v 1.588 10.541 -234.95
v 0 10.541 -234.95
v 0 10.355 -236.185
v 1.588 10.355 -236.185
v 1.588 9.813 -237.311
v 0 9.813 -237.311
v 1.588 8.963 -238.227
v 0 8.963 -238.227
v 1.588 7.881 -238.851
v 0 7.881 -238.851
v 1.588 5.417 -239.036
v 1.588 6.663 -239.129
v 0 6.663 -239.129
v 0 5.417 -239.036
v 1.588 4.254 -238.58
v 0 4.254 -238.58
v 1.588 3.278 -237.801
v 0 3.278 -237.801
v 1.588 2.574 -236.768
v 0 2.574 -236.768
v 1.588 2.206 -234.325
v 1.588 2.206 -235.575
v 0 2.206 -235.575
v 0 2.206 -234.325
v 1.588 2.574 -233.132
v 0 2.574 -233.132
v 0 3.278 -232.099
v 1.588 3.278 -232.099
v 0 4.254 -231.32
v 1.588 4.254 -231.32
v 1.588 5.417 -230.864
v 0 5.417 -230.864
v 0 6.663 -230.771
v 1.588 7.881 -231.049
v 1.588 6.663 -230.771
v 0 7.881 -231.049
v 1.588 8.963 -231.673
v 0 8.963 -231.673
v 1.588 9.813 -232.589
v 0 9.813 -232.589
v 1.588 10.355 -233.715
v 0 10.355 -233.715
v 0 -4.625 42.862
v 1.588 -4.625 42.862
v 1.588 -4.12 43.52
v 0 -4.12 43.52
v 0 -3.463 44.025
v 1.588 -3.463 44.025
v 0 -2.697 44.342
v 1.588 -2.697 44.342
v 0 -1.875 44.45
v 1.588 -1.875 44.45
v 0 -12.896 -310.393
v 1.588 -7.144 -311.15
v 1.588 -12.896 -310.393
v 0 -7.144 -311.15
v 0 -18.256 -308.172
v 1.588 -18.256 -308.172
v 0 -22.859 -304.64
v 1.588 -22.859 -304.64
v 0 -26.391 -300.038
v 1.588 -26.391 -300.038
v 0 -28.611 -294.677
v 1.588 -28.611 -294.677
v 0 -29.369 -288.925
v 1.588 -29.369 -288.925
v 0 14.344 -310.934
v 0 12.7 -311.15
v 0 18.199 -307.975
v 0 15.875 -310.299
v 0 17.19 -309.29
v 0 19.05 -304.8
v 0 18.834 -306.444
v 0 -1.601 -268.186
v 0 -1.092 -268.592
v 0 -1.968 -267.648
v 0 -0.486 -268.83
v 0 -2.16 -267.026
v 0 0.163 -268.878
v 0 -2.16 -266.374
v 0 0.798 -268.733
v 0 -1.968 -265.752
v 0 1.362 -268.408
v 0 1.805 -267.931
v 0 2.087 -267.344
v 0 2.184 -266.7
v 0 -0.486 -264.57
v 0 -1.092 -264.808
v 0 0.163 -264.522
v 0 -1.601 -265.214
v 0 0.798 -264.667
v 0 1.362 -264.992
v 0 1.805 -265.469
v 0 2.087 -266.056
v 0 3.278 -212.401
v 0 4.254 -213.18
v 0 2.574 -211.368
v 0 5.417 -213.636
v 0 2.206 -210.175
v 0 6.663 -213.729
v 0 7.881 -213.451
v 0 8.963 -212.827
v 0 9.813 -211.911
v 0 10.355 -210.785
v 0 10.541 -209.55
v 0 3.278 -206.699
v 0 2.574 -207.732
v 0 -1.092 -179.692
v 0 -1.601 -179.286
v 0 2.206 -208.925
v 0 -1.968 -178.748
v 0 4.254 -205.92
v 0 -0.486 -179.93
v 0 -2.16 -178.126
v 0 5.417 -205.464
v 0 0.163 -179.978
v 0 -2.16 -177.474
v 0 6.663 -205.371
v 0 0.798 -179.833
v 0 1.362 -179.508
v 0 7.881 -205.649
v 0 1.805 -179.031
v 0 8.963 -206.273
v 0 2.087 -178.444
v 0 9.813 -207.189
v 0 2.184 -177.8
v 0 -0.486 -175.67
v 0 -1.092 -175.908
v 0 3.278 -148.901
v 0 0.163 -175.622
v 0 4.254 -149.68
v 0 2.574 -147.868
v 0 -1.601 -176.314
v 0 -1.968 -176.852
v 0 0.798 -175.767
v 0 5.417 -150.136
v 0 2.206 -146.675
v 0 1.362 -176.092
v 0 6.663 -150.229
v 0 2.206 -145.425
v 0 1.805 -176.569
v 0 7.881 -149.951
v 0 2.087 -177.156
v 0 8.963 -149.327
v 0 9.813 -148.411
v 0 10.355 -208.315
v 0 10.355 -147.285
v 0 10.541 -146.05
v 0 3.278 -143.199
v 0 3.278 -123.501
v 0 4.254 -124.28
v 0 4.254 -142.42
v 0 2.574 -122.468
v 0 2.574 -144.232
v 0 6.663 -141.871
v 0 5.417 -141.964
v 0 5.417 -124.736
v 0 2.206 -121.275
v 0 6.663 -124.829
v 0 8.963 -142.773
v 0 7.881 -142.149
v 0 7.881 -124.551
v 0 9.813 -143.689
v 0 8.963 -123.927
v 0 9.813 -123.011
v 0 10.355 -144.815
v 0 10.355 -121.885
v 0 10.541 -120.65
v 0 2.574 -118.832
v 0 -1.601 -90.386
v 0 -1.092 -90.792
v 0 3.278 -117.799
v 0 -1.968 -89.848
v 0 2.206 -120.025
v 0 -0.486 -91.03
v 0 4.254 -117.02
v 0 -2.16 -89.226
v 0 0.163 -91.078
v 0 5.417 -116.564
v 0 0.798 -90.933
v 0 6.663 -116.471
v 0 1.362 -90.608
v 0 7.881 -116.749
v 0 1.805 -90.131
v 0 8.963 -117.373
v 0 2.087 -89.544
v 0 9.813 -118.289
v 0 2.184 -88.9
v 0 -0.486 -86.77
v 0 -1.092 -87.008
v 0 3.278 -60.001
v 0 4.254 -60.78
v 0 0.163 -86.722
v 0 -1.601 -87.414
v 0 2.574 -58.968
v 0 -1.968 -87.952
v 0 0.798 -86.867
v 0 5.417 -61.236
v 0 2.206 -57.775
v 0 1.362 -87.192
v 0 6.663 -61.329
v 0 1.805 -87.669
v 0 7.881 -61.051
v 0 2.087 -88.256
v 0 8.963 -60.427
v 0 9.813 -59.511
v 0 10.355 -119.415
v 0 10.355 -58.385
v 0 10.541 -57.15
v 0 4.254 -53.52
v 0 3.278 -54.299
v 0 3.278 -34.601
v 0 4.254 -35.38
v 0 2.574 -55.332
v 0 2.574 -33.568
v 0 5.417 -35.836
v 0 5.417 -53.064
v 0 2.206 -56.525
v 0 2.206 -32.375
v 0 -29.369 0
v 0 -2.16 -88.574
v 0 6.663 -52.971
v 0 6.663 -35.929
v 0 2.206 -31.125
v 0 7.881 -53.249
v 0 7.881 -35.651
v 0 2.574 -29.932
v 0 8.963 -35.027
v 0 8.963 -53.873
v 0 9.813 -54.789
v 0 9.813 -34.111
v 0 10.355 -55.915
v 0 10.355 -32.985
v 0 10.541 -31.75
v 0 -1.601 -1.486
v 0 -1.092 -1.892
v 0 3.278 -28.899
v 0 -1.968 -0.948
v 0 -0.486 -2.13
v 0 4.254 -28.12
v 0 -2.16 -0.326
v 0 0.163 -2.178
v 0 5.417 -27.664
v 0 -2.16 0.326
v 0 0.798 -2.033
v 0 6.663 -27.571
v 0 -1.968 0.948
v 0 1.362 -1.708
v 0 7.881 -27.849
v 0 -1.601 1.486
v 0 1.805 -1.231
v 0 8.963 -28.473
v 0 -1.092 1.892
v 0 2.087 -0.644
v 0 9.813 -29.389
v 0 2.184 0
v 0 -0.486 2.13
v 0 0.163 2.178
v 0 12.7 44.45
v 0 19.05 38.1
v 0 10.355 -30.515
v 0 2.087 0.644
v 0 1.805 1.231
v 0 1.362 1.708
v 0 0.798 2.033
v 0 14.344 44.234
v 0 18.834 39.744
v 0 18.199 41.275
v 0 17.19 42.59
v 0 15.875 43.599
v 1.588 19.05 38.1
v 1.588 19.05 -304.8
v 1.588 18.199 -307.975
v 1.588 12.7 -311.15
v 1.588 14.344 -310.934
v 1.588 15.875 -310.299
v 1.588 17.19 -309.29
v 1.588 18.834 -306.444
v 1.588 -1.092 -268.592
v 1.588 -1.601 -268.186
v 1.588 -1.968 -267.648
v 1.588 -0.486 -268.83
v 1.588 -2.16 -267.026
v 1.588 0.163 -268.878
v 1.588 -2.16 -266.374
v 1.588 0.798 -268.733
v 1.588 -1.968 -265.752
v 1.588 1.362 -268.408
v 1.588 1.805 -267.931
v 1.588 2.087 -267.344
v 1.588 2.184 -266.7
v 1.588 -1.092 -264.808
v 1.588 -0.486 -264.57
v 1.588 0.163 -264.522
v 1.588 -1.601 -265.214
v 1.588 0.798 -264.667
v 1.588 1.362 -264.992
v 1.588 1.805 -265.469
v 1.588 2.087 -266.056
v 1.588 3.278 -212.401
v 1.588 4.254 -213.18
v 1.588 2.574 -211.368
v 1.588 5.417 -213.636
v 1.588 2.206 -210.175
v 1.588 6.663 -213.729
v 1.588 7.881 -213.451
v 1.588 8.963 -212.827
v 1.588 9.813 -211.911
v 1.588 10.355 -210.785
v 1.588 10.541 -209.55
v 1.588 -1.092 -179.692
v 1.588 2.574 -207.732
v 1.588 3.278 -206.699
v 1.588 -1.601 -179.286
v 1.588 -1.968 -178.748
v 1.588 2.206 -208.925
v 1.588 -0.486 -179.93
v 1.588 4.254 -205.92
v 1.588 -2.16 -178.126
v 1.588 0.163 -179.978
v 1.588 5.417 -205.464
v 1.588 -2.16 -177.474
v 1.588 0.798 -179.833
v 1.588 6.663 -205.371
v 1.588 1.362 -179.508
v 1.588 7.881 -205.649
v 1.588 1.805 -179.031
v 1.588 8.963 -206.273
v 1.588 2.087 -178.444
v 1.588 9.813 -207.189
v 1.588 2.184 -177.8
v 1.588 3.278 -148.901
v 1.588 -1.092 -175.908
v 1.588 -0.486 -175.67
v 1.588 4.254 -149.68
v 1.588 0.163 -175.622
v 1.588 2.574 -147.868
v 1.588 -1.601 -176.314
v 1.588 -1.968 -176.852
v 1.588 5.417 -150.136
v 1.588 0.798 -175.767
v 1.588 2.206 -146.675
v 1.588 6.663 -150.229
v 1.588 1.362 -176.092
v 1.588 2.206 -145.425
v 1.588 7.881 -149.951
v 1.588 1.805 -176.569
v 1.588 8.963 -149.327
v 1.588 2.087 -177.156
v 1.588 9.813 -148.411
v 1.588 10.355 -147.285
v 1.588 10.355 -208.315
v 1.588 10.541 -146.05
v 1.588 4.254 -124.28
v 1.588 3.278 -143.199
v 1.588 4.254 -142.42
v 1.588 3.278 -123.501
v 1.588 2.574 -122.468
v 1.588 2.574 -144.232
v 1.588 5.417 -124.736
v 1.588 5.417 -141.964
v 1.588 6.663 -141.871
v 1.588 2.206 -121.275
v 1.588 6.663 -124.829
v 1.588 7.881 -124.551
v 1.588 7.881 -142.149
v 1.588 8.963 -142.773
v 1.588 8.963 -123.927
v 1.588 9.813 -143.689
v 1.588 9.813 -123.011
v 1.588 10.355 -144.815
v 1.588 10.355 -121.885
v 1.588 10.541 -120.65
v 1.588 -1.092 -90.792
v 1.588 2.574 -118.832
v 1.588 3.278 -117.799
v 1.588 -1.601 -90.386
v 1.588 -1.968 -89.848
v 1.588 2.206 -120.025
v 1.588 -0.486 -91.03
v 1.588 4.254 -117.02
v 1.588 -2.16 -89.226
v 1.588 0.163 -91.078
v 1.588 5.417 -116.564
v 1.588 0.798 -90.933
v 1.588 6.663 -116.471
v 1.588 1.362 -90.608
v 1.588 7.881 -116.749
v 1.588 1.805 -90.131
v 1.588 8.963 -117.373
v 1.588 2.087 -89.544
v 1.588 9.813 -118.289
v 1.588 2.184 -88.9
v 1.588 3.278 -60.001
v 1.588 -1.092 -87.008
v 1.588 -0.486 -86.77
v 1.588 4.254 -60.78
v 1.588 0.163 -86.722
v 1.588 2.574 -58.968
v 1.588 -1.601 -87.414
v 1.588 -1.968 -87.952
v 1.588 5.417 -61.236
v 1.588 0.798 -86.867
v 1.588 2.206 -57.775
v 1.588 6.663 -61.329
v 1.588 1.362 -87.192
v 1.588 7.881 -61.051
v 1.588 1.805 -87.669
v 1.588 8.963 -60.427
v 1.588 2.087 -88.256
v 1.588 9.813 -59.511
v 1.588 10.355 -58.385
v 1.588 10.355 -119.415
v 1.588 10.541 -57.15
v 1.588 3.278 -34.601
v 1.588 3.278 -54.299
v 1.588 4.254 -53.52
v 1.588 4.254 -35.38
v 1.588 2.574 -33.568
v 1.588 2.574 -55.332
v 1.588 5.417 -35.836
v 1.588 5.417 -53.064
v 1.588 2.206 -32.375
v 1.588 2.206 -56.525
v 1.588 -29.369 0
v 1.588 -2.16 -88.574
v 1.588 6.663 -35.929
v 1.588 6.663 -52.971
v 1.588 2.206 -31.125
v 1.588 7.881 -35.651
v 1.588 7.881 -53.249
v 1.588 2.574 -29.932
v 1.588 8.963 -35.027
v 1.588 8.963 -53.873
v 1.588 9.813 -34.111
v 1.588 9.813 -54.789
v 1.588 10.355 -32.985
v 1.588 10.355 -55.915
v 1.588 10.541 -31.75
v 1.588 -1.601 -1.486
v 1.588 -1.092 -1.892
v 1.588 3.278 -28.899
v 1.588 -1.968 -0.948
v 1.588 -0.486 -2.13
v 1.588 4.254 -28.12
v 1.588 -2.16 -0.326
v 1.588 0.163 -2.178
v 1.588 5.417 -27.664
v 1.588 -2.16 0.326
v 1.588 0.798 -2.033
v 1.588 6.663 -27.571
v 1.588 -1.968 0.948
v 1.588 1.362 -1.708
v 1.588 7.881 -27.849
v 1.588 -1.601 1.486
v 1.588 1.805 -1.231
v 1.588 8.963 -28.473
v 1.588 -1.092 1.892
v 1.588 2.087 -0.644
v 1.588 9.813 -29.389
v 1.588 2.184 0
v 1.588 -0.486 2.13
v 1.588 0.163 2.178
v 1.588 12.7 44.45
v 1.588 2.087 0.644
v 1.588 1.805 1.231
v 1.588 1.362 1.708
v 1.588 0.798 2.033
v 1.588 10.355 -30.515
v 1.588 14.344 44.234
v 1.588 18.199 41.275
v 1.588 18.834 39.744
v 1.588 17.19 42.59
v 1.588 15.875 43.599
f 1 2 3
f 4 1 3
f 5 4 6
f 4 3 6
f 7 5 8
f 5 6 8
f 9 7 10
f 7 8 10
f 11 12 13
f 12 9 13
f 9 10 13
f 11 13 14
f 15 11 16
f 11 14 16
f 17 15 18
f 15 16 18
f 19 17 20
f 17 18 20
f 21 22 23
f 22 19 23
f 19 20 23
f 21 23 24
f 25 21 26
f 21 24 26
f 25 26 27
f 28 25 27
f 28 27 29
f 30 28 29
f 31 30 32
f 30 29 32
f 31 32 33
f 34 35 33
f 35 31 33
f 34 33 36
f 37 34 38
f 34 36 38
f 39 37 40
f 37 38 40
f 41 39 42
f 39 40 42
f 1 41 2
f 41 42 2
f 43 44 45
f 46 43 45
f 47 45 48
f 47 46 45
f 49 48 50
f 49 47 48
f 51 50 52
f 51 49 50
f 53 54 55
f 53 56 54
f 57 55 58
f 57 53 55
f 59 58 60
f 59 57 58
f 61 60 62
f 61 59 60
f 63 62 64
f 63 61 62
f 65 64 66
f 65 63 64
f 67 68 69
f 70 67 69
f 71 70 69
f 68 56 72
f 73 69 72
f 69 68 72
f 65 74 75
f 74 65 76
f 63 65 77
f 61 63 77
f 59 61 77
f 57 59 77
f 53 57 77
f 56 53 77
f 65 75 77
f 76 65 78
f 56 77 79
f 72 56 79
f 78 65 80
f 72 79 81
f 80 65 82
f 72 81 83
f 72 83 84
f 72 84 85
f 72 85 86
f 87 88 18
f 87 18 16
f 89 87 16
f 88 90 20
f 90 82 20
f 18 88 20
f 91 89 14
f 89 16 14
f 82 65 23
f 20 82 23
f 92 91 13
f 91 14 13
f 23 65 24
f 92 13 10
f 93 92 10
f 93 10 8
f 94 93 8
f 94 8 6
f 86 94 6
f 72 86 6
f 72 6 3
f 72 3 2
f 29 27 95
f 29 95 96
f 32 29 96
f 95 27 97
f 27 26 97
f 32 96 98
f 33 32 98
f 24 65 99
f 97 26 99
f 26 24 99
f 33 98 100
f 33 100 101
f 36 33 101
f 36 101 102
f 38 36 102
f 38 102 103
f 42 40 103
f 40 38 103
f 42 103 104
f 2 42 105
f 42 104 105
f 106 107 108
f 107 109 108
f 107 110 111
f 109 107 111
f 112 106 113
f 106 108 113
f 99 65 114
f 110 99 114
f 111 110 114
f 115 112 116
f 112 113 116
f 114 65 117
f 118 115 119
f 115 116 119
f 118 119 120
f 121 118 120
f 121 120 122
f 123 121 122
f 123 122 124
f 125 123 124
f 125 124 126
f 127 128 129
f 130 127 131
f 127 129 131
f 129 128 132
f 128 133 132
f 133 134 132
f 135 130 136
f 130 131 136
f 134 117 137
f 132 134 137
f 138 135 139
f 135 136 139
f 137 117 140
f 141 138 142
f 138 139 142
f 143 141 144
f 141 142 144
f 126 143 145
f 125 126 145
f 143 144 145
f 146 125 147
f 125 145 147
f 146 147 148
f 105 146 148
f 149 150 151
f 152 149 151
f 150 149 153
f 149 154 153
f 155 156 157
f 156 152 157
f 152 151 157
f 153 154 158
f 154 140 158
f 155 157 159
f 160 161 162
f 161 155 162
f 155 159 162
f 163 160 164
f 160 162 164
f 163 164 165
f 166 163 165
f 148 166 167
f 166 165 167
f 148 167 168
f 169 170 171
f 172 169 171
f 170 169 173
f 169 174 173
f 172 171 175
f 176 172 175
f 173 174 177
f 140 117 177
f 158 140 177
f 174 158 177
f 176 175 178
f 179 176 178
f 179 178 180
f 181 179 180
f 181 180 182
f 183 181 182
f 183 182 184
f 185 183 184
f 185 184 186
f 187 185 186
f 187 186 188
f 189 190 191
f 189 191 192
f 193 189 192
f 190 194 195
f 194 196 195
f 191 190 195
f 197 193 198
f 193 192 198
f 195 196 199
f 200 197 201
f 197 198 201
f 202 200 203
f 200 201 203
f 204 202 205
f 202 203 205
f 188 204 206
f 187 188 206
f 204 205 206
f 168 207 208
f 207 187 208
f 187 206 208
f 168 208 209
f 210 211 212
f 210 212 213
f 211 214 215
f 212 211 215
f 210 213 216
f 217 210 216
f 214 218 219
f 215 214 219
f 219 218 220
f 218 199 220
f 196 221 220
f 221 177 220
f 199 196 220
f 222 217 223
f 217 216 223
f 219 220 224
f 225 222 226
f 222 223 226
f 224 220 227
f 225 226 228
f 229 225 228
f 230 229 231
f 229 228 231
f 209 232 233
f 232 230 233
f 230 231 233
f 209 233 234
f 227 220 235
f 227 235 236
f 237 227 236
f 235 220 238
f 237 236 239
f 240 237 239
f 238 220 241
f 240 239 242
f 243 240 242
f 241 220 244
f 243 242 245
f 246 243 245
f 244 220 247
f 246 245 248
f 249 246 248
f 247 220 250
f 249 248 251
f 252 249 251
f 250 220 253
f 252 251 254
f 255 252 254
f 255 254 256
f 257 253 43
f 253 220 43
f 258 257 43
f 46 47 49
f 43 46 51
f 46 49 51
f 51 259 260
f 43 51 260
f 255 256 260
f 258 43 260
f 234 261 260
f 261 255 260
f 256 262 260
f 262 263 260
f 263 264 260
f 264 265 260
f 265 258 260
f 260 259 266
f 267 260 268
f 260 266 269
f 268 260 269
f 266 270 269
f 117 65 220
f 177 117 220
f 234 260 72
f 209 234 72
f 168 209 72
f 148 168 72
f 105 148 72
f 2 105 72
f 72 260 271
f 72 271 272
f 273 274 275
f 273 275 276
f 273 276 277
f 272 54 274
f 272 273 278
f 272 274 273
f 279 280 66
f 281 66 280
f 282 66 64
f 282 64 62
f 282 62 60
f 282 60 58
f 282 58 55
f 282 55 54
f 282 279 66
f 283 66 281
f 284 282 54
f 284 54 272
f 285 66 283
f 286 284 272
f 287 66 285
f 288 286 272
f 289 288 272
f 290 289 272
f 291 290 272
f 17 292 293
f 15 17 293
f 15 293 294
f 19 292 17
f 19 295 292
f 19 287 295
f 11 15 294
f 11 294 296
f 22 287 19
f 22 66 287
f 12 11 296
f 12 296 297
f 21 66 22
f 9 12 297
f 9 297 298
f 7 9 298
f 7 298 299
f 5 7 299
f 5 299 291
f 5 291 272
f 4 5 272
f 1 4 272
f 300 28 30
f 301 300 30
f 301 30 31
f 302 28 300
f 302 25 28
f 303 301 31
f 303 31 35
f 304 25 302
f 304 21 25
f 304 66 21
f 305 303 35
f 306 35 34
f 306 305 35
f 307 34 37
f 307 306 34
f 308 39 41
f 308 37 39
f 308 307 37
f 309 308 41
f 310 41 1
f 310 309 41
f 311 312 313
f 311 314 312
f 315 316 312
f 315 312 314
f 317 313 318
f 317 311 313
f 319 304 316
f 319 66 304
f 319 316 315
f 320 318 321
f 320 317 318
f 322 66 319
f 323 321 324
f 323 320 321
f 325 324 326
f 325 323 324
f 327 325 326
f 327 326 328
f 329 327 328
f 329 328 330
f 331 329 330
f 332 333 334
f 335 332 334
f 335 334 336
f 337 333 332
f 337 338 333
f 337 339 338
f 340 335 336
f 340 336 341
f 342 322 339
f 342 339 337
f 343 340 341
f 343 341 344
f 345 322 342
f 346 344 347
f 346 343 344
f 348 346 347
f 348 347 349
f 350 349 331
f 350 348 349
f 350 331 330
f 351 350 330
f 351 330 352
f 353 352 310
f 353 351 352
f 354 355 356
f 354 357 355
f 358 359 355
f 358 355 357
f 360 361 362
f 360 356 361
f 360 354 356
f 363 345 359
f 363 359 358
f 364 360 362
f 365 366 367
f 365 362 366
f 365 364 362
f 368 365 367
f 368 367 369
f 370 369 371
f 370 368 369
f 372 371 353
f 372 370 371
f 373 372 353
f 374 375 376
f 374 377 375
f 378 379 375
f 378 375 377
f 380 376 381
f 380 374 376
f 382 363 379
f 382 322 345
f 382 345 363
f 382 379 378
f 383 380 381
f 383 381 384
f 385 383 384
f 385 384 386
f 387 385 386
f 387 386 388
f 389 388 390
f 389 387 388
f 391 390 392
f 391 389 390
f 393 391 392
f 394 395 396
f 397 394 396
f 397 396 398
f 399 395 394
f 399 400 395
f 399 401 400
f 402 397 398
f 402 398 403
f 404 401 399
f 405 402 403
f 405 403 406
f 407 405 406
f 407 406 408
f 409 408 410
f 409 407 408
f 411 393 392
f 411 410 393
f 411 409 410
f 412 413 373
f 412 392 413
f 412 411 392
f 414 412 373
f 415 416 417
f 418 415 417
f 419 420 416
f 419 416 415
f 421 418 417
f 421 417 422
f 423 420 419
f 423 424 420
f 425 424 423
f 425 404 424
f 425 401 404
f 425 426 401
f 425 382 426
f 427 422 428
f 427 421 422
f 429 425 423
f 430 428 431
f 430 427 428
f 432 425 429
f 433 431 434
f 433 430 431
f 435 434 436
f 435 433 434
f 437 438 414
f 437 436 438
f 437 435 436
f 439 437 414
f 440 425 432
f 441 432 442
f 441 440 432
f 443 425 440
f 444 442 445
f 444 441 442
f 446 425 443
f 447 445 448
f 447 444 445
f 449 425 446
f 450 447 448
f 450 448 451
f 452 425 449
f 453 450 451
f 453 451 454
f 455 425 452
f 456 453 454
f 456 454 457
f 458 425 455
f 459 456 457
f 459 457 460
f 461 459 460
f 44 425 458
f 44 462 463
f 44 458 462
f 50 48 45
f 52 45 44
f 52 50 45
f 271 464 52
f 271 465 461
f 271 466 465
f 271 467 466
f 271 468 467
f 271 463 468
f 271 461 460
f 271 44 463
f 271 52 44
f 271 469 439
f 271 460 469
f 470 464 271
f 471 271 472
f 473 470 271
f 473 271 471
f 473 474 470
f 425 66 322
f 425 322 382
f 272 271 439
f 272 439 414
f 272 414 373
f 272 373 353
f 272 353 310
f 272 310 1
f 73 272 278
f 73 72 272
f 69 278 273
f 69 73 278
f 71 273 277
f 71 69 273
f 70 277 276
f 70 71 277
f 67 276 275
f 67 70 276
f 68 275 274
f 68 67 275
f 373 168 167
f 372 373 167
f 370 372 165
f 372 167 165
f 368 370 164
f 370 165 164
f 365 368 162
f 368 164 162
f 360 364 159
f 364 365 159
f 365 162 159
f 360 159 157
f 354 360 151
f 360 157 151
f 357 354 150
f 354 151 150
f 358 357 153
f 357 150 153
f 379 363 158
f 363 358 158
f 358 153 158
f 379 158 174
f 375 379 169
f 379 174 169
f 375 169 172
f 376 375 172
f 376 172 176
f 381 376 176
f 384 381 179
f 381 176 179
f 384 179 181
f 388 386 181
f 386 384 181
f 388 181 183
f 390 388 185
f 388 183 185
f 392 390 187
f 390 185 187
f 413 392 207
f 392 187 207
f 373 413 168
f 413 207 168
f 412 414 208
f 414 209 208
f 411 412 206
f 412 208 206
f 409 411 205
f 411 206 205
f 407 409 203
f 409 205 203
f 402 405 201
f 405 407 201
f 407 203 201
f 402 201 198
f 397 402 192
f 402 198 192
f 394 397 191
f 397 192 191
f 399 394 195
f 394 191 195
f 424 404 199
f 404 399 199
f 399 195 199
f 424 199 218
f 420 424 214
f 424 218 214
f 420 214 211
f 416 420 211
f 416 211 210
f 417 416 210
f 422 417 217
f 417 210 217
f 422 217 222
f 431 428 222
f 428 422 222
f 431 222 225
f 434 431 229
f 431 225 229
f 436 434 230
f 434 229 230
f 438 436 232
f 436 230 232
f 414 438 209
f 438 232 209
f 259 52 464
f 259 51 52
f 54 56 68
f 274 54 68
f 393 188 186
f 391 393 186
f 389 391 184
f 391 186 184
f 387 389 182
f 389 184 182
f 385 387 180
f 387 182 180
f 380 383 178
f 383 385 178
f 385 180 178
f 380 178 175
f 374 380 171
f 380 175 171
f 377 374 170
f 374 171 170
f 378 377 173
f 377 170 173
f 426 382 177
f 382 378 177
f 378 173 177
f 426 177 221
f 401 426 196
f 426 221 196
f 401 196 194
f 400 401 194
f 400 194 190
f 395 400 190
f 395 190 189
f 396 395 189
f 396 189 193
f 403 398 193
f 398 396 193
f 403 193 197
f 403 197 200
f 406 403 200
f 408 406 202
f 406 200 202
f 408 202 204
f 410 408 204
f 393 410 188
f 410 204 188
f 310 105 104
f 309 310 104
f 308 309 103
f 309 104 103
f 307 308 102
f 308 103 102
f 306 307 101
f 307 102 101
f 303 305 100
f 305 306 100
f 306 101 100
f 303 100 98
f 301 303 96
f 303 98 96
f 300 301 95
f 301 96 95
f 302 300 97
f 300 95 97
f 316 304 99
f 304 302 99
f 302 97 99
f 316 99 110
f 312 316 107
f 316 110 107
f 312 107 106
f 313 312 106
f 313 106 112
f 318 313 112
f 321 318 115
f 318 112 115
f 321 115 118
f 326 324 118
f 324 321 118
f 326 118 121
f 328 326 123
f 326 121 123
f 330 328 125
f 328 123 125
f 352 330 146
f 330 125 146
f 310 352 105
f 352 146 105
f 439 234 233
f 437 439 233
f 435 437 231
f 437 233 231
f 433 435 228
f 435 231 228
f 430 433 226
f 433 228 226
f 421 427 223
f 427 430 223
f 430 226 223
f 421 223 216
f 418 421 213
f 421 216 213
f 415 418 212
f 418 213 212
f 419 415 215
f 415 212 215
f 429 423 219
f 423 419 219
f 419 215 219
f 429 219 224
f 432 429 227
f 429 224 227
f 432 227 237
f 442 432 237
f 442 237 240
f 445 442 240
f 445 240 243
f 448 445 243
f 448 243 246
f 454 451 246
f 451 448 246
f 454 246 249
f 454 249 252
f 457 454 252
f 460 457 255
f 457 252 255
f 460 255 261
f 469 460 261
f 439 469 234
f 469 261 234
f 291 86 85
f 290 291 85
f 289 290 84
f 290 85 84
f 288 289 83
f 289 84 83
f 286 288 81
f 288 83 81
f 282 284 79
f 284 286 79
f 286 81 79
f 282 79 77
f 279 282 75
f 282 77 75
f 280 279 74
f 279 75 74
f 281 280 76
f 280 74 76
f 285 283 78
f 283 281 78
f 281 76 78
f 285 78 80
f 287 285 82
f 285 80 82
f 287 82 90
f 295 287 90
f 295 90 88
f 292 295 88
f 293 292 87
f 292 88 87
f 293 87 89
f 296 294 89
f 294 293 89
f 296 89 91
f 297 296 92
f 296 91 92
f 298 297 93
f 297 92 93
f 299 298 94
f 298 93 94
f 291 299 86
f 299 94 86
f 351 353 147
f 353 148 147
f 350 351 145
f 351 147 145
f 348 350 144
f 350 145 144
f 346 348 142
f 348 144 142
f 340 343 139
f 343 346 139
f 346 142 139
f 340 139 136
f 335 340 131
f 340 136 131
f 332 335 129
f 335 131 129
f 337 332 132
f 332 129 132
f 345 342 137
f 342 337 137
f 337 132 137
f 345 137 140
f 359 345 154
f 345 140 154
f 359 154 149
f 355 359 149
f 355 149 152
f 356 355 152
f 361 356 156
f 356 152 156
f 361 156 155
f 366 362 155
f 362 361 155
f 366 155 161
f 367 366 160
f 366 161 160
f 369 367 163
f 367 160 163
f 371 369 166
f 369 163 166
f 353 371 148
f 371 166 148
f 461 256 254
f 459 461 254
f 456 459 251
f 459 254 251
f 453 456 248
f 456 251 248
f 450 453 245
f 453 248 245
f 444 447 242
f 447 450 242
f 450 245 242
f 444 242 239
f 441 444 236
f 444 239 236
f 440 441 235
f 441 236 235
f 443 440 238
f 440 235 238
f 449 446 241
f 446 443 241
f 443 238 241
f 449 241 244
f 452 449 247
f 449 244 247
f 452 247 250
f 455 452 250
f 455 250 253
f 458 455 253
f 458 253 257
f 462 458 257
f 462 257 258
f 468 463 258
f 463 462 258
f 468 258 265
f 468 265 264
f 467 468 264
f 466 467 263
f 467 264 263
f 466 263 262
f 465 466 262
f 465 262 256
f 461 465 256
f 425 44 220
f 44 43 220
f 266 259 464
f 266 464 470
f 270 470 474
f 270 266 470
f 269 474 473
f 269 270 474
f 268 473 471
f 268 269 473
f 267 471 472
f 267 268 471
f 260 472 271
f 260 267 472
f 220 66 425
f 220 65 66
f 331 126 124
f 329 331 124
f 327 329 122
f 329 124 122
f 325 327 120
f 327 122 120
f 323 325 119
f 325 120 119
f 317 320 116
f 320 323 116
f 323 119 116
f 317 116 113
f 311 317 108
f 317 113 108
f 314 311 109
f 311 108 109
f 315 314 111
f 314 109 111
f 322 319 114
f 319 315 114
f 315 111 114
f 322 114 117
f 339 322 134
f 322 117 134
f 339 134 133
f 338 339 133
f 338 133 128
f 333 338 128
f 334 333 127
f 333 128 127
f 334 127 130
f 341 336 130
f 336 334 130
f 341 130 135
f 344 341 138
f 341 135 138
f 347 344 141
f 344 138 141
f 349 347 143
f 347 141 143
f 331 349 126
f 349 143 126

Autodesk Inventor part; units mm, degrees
ref_plane "YZ Plane" through (0, 0, 0) normal (1, 0, 0) x (0, 1, 0)
ref_plane "XZ Plane" through (0, 0, 0) normal (0, 1, 0) x (-1, 0, 0)
ref_plane "XY Plane" through (0, 0, 0) normal (0, 0, 1) x (1, 0, 0)
sketch "main" plane through (0, 0, 0) normal (0, 0, 1) x (1, 0, 0)
  circle A0 centre (-6.8277, 139.0371) radius 2.1844
  circle A1 centre (-0.4777, 107.2871) radius 4.191
  line L0 (-8.7029, 183.4871) -> (6.7737, 183.4871)
  circle A2 centre (-6.8277, 50.1371) radius 2.1844
  circle A3 centre (-6.8277, -38.7629) radius 2.1844
  circle A4 centre (-6.8277, -127.6629) radius 2.1844
  circle A5 centre (-0.4777, 81.8871) radius 4.191
  circle A6 centre (-0.4777, 18.3871) radius 4.191
  line L1 (-36.1964, -149.8879) -> (-36.1964, 139.0371)
  circle A7 centre (-0.4777, -70.5129) radius 4.191
  circle A8 centre (-0.4777, -95.9129) radius 4.191
  line L2 (6.7053, -172.1129) -> (5.8723, -172.1129)
  line L3 (-13.9714, -172.1129) -> (6.7053, -172.1129)
  arc A9 (-36.1964, -149.8879) -> (-13.9714, -172.1129) centre (-13.9714, -149.8879) ccw
  circle A10 centre (-0.4777, -7.0129) radius 4.191
  line L4 (-11.4526, 181.8995) -> (-36.1964, 139.0371)
  arc A11 (-8.7029, 183.4871) -> (-11.4526, 181.8995) centre (-8.7029, 180.3121) ccw
  line L5 (-8.7029, 183.4871) -> (5.8723, 183.4871)
  line L6 (12.2223, 177.1371) -> (12.2223, -165.7629)
  arc A12 (12.2223, 177.1371) -> (5.8723, 183.4871) centre (5.8723, 177.1371) ccw
  arc A13 (5.8723, -172.1129) -> (12.2223, -165.7629) centre (5.8723, -165.7629) ccw
  point P0 (2.0753, 1.669)
  point P1 (-10.536, 183.4871)
  point P2 (5.8723, 139.0371)
  point P3 (12.2223, 183.4871)
  dimension "d4" = 8.382
  dimension "d5" = 8.382
  dimension "d6" = 8.382
  dimension "d7" = 8.382
  dimension "d8" = 8.382
  dimension "d9" = 8.382
  dimension "d10" = 12.7
  dimension "d11" = 0
  dimension "d12" = 88.9
  dimension "d13" = 88.9
  dimension "d14" = 88.9
  dimension "d15" = 29.3687
  dimension "d16" = 3.175
  dimension "d18" = 6.35
  dimension "d19" = 6.35
  dimension "d20" = 22.225
sketch "Sketch1" plane through (0, 0, 0) normal (1, 0, 0) x (0, 1, 0)
  circle A0 centre (0, 0) radius 2.1844
  circle A1 centre (6.35, -31.75) radius 4.191
  line L0 (-1.8752, 44.45) -> (13.6014, 44.45)
  circle A2 centre (0, -88.9) radius 2.1844
  circle A3 centre (0, -177.8) radius 2.1844
  circle A4 centre (0, -266.7) radius 2.1844
  circle A5 centre (6.35, -57.15) radius 4.191
  circle A6 centre (6.35, -120.65) radius 4.191
  line L1 (-29.3687, -288.925) -> (-29.3687, 0)
  circle A7 centre (6.35, -209.55) radius 4.191
  circle A8 centre (6.35, -234.95) radius 4.191
  line L2 (13.533, -311.15) -> (12.7, -311.15)
  line L3 (-7.1437, -311.15) -> (13.533, -311.15)
  arc A9 (-29.3687, -288.925) -> (-7.1437, -311.15) centre (-7.1437, -288.925) ccw
  circle A10 centre (6.35, -146.05) radius 4.191
  line L4 (-4.6249, 42.8624) -> (-29.3687, 0)
  arc A11 (-1.8752, 44.45) -> (-4.6249, 42.8624) centre (-1.8752, 41.275) ccw
  line L5 (-1.8752, 44.45) -> (12.7, 44.45)
  line L6 (19.05, 38.1) -> (19.05, -304.8)
  arc A12 (19.05, 38.1) -> (12.7, 44.45) centre (12.7, 38.1) ccw
  arc A13 (12.7, -311.15) -> (19.05, -304.8) centre (12.7, -304.8) ccw
extrude "Extrusion1" add sketch "Sketch1" along normal blind 1.5875
properties part number "Skirt" material "Acetal Resin, White"
